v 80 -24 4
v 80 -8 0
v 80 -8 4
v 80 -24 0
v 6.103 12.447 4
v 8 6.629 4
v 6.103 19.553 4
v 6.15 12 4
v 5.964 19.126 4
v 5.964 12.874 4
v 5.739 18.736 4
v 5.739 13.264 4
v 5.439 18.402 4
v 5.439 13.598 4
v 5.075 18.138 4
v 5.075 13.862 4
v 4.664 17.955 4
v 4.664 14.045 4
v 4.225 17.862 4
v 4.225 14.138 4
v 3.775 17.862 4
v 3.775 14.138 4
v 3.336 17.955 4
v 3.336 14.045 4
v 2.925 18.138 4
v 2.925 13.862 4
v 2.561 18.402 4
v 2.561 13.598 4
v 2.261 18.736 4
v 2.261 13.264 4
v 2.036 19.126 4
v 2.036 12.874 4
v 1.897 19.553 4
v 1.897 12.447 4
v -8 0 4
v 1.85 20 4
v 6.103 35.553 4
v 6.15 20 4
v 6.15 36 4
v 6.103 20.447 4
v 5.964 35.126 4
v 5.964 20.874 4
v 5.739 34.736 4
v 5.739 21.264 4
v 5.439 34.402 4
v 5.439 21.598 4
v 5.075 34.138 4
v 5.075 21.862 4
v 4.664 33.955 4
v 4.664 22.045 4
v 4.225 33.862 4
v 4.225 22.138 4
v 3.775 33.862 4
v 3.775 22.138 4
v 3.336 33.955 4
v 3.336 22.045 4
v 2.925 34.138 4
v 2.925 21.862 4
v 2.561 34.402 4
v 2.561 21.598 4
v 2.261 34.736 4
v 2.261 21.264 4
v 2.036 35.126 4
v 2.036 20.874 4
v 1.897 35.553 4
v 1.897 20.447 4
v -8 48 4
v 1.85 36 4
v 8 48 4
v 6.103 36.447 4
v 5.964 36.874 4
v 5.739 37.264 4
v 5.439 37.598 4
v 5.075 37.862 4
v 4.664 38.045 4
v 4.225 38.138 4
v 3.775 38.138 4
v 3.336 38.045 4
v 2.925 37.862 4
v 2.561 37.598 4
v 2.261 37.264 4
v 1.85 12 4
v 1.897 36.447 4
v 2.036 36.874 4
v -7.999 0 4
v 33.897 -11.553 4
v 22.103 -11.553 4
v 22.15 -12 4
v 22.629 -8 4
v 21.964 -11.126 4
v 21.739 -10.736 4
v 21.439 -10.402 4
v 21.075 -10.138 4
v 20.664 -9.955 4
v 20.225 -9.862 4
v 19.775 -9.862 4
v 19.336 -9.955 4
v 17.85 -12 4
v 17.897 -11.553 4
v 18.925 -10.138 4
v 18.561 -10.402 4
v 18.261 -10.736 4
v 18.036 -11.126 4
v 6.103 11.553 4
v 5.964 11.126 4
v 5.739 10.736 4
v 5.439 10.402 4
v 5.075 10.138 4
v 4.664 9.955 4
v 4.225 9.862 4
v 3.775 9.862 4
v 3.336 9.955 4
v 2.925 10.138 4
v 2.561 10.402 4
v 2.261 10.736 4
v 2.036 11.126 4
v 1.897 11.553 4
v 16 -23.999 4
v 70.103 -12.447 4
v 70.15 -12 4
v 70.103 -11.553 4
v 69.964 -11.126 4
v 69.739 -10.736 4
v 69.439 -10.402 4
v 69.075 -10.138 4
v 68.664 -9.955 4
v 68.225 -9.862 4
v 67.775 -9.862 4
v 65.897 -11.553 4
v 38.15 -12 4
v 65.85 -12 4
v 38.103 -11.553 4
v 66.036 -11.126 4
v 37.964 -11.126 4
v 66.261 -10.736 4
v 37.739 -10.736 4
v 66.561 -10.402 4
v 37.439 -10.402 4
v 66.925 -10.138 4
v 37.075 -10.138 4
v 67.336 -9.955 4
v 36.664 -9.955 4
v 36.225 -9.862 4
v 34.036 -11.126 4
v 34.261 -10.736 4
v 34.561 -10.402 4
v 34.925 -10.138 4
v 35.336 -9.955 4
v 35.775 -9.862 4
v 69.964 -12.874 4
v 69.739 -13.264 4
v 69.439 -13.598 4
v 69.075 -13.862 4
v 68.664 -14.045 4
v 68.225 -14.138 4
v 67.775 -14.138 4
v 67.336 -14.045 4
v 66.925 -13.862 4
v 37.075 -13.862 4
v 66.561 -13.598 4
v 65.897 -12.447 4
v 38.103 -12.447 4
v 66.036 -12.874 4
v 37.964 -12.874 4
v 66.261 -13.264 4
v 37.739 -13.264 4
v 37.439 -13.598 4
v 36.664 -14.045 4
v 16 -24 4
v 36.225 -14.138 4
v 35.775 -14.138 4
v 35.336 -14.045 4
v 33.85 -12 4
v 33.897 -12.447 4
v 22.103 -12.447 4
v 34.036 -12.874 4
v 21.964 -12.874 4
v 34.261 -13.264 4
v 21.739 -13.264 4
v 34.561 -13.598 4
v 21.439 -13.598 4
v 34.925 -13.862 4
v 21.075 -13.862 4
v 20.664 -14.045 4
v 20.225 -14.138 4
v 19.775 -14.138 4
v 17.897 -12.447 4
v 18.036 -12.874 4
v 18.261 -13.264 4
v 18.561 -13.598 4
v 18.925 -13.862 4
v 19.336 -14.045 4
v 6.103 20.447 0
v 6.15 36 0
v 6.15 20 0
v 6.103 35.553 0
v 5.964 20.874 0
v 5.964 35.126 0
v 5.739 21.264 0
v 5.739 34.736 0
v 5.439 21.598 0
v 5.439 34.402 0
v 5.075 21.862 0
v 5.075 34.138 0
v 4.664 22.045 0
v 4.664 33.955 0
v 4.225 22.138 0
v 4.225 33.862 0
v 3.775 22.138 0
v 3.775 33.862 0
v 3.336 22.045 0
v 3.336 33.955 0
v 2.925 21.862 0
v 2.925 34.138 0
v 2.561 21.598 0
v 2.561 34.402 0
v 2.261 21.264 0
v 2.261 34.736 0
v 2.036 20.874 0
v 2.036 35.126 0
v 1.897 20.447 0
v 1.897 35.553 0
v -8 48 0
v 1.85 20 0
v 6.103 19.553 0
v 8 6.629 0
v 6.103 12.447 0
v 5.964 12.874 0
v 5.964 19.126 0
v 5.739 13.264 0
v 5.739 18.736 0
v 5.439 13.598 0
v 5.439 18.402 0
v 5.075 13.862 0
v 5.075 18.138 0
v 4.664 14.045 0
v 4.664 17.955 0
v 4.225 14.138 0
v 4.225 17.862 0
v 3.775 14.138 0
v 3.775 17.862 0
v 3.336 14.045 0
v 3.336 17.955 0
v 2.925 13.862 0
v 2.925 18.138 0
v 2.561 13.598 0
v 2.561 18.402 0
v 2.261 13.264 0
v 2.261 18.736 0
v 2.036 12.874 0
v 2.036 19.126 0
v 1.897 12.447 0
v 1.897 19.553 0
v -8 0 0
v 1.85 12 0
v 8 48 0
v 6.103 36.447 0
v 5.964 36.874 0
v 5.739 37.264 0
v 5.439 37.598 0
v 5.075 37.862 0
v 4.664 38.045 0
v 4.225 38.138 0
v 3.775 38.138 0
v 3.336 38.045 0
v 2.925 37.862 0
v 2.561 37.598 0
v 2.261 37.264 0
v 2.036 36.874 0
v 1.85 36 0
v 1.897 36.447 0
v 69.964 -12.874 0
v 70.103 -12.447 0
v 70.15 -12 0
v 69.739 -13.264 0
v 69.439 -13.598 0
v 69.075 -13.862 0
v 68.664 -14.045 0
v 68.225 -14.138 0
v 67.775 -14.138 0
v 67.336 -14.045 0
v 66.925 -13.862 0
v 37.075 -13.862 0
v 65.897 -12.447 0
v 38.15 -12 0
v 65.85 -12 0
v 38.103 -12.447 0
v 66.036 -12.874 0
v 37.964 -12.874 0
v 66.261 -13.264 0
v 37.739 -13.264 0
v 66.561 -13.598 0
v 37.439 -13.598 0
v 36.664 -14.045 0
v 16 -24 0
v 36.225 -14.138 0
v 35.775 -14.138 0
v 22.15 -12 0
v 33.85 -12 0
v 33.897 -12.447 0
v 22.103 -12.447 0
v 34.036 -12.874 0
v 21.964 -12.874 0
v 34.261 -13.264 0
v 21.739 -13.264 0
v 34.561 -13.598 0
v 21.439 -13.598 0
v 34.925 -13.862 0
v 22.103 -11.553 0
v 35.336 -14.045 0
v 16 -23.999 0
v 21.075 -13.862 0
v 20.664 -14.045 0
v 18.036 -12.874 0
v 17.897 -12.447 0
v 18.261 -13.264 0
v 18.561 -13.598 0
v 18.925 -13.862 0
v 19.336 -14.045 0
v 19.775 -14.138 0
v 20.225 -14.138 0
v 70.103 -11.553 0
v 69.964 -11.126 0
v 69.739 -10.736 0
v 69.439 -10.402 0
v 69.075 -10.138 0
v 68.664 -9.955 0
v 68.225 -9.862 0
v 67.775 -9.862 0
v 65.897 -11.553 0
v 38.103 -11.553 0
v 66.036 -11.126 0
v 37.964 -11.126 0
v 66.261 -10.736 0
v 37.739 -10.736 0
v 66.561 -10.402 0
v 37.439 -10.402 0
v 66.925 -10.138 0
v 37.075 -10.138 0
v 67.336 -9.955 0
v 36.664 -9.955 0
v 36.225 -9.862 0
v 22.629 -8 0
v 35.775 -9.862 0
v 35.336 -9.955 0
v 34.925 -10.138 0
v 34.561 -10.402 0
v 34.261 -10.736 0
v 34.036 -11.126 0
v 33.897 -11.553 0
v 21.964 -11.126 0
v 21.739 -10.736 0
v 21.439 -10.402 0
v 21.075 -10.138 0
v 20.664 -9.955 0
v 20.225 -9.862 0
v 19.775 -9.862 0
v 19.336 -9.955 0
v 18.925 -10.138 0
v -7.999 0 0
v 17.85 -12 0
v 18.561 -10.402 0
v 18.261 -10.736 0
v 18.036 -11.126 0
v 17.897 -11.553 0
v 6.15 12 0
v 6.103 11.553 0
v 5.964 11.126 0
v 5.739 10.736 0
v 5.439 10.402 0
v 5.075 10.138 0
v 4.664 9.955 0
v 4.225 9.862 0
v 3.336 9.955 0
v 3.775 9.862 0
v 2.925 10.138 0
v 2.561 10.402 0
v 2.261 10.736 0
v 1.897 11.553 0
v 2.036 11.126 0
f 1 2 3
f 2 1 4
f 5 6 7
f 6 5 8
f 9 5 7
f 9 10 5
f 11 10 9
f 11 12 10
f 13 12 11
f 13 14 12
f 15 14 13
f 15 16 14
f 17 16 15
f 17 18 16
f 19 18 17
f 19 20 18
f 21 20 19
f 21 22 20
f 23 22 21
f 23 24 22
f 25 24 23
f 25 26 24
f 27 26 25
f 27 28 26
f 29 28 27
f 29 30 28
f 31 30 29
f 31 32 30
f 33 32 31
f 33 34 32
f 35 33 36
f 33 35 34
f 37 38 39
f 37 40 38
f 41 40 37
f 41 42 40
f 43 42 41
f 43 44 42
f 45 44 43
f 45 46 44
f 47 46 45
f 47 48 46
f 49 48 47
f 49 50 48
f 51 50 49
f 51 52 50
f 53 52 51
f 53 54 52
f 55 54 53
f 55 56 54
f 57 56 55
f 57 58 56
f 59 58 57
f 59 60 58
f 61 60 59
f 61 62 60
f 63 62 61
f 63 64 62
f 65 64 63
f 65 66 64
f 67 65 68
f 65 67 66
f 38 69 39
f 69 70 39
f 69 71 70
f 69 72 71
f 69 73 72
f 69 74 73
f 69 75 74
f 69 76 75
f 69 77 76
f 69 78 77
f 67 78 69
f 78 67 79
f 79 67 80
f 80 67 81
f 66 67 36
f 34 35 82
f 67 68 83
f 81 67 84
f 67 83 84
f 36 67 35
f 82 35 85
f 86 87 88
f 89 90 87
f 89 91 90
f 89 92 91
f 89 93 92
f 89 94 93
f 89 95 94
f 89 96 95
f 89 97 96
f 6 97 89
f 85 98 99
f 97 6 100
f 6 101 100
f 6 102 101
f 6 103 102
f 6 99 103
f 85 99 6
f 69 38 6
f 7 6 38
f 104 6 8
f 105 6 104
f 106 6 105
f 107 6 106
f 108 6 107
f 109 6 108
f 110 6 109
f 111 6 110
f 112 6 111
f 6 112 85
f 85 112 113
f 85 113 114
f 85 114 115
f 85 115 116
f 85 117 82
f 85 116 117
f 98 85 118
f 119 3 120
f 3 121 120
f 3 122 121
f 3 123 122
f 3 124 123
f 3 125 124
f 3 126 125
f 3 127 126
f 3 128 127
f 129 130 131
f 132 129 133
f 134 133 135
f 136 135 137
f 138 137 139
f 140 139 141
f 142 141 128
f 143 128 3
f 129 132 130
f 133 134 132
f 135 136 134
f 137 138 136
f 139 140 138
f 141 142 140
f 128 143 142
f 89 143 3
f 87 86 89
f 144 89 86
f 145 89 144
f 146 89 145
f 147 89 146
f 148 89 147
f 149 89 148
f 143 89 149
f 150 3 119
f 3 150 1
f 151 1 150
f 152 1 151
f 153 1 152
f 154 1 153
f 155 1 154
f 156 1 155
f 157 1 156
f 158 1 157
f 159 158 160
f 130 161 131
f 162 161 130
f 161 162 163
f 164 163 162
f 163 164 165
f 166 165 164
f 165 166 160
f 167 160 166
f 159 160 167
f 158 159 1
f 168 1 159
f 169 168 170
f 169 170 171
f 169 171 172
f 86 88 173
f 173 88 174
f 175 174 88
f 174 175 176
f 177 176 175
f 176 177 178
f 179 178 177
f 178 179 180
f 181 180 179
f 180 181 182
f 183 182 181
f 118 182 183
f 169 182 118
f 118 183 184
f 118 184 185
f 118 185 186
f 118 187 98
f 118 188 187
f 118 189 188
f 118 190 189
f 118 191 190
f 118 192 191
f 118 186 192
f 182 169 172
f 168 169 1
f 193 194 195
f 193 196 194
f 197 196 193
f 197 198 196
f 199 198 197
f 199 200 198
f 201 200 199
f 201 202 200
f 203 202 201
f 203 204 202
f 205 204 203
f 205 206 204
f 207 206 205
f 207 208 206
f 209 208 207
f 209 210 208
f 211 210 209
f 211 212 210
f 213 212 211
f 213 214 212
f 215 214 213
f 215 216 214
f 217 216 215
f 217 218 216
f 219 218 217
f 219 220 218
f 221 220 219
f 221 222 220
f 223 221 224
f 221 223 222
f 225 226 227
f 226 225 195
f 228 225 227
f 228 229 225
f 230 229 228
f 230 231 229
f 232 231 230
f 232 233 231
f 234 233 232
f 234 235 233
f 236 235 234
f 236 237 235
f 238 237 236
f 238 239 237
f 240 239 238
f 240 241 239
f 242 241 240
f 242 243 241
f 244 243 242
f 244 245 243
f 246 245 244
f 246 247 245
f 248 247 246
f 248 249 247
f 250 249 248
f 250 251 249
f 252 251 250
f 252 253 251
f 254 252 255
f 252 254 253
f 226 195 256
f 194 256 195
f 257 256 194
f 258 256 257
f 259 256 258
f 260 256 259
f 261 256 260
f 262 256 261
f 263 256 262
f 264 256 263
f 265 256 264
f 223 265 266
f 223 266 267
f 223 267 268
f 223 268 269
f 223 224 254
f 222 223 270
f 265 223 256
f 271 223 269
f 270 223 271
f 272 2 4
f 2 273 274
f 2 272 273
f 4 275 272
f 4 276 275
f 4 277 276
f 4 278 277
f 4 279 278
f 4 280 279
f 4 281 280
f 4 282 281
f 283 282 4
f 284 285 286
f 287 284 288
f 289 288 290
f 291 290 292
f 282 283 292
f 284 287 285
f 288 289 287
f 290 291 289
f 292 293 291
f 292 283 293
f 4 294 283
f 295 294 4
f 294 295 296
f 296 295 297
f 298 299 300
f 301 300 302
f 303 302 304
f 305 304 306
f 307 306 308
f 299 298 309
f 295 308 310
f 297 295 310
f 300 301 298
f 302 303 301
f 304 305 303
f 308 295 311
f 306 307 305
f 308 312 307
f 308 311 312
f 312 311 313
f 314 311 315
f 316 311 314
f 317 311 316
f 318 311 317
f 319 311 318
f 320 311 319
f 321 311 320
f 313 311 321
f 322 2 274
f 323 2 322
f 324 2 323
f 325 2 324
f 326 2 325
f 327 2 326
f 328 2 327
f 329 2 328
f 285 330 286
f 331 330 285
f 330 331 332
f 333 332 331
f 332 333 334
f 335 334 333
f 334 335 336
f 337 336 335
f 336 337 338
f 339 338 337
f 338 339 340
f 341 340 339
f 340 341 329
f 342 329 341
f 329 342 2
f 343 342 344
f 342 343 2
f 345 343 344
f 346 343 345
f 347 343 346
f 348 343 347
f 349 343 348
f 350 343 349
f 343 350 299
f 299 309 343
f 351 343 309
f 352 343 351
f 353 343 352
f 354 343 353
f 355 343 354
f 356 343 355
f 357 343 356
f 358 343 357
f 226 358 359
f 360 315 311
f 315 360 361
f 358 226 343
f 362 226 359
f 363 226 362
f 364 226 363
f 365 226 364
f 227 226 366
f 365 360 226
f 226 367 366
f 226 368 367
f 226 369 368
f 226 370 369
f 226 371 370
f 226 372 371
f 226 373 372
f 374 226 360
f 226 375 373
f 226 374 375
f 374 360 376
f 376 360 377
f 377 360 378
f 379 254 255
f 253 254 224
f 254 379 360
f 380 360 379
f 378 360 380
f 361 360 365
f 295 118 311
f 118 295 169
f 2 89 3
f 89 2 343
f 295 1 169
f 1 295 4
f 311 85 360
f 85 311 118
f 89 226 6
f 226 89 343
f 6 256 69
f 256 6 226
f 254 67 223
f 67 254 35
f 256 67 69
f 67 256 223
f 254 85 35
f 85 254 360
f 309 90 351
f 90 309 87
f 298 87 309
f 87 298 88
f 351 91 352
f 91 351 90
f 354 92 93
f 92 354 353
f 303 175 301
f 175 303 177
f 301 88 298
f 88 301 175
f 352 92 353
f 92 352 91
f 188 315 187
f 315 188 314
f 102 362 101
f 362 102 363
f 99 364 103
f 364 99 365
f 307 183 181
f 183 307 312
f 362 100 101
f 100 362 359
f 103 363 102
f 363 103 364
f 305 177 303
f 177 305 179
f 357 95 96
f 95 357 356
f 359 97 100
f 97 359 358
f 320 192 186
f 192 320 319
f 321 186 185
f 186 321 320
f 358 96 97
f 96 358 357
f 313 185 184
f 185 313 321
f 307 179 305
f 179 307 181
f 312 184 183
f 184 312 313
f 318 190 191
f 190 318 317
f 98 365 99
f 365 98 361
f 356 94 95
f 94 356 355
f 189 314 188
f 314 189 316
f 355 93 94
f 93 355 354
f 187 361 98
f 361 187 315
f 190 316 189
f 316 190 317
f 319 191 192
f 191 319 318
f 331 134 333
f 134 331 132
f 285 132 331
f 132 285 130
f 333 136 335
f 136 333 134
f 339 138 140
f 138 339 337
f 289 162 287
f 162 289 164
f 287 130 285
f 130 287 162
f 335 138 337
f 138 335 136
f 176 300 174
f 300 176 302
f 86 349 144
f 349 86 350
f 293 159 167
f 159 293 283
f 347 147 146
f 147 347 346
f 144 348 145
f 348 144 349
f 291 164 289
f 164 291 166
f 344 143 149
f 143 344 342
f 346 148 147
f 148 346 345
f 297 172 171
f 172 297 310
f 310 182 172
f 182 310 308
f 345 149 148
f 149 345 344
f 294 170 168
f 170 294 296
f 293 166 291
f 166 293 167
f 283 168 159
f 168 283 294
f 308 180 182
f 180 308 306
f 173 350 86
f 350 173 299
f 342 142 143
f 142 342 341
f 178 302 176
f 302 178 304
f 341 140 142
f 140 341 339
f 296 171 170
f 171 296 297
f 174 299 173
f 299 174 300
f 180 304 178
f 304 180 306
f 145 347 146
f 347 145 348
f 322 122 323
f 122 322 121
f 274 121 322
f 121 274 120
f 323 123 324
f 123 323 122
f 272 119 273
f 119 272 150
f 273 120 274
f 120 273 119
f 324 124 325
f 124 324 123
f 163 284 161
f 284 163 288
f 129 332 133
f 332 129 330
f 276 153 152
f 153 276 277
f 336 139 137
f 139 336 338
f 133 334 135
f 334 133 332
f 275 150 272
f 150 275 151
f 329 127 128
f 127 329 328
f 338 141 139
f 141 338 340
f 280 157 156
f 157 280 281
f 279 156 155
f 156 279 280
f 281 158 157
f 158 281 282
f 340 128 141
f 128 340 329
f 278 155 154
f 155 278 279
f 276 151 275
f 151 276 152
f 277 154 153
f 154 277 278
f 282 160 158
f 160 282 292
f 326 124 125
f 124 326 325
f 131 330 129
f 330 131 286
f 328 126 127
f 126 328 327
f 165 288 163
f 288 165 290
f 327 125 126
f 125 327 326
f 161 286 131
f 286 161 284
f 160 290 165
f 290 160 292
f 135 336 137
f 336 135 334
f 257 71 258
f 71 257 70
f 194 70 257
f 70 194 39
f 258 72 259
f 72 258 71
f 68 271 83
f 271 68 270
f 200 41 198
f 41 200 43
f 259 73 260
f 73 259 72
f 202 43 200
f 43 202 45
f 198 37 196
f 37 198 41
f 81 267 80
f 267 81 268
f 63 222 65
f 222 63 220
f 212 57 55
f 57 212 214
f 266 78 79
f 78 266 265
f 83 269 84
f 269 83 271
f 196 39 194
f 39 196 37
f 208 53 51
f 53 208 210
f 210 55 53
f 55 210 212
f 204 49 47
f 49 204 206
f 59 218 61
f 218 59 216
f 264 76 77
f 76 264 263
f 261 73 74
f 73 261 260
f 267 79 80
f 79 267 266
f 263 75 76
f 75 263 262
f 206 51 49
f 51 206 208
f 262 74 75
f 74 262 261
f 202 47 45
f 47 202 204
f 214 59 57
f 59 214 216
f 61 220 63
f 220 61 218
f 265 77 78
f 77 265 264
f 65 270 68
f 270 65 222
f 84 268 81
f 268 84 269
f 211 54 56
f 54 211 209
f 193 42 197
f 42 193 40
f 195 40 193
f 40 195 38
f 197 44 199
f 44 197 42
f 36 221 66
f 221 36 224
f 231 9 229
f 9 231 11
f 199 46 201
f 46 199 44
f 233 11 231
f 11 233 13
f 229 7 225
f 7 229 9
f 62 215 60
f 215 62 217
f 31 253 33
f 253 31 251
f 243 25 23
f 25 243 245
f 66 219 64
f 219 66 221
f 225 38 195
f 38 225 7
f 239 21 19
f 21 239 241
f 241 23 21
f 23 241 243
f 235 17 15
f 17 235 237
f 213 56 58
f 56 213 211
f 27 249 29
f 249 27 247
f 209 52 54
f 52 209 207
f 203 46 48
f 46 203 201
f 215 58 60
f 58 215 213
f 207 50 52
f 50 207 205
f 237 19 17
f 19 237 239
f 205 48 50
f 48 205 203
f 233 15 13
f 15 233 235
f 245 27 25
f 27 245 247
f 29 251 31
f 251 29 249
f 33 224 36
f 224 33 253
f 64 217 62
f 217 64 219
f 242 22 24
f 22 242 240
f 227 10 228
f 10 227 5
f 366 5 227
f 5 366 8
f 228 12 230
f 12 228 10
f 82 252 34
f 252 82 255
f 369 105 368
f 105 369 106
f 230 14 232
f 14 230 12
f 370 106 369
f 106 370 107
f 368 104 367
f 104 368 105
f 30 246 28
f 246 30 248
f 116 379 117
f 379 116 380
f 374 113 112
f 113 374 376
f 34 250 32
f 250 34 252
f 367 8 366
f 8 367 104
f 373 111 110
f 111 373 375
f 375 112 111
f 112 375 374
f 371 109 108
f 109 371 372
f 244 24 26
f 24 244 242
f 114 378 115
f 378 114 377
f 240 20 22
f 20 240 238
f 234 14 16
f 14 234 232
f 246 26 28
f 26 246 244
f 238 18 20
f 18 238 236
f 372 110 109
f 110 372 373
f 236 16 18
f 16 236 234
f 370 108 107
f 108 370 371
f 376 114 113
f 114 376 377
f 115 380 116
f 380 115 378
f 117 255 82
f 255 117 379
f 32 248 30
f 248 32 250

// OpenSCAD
difference () {
union() {
    translate([16,-24,0])
    cube([64,16,4]);
    
    // Section 2 at a 45º angle
        // not sure on 3.315. value is estimated
    translate([3.315,11.3136,0])
    rotate([0,0,225])
    cube([16,33.94,4]);
        
    // Section 1
    translate([-8,0,0])
    cube([16,48,4]);
}
    
    // Hole 4 from the piece
    translate([20,-12,-2])
    cylinder(r=2.15,45, $fn=30);

    // Hole 5 from the piece
    translate([36,-12,-2])
    cylinder(r=2.15,45, $fn=30);
    
    // Hole 6 from the piece (compatible with lego board and base plate)
    translate([68,-12,-2])
    cylinder(r=2.15,44, $fn=30);
    
    // Hole 1
    translate([4,36,-2])
    cylinder(r=2.15,44, $fn=30);

    // Hole 2
    translate([4,20,-2])
    cylinder(r=2.15,44, $fn=30);

    // Hole 3 (compatible with lego board)
    translate([4,12,-2])
    cylinder(r=2.15,44, $fn=30);

}

// base plate positioned for top track
// color ("blue")
// translate([-112,-144,4])
// import("/Users/harperdaniels/Downloads/plate-2.stl");
